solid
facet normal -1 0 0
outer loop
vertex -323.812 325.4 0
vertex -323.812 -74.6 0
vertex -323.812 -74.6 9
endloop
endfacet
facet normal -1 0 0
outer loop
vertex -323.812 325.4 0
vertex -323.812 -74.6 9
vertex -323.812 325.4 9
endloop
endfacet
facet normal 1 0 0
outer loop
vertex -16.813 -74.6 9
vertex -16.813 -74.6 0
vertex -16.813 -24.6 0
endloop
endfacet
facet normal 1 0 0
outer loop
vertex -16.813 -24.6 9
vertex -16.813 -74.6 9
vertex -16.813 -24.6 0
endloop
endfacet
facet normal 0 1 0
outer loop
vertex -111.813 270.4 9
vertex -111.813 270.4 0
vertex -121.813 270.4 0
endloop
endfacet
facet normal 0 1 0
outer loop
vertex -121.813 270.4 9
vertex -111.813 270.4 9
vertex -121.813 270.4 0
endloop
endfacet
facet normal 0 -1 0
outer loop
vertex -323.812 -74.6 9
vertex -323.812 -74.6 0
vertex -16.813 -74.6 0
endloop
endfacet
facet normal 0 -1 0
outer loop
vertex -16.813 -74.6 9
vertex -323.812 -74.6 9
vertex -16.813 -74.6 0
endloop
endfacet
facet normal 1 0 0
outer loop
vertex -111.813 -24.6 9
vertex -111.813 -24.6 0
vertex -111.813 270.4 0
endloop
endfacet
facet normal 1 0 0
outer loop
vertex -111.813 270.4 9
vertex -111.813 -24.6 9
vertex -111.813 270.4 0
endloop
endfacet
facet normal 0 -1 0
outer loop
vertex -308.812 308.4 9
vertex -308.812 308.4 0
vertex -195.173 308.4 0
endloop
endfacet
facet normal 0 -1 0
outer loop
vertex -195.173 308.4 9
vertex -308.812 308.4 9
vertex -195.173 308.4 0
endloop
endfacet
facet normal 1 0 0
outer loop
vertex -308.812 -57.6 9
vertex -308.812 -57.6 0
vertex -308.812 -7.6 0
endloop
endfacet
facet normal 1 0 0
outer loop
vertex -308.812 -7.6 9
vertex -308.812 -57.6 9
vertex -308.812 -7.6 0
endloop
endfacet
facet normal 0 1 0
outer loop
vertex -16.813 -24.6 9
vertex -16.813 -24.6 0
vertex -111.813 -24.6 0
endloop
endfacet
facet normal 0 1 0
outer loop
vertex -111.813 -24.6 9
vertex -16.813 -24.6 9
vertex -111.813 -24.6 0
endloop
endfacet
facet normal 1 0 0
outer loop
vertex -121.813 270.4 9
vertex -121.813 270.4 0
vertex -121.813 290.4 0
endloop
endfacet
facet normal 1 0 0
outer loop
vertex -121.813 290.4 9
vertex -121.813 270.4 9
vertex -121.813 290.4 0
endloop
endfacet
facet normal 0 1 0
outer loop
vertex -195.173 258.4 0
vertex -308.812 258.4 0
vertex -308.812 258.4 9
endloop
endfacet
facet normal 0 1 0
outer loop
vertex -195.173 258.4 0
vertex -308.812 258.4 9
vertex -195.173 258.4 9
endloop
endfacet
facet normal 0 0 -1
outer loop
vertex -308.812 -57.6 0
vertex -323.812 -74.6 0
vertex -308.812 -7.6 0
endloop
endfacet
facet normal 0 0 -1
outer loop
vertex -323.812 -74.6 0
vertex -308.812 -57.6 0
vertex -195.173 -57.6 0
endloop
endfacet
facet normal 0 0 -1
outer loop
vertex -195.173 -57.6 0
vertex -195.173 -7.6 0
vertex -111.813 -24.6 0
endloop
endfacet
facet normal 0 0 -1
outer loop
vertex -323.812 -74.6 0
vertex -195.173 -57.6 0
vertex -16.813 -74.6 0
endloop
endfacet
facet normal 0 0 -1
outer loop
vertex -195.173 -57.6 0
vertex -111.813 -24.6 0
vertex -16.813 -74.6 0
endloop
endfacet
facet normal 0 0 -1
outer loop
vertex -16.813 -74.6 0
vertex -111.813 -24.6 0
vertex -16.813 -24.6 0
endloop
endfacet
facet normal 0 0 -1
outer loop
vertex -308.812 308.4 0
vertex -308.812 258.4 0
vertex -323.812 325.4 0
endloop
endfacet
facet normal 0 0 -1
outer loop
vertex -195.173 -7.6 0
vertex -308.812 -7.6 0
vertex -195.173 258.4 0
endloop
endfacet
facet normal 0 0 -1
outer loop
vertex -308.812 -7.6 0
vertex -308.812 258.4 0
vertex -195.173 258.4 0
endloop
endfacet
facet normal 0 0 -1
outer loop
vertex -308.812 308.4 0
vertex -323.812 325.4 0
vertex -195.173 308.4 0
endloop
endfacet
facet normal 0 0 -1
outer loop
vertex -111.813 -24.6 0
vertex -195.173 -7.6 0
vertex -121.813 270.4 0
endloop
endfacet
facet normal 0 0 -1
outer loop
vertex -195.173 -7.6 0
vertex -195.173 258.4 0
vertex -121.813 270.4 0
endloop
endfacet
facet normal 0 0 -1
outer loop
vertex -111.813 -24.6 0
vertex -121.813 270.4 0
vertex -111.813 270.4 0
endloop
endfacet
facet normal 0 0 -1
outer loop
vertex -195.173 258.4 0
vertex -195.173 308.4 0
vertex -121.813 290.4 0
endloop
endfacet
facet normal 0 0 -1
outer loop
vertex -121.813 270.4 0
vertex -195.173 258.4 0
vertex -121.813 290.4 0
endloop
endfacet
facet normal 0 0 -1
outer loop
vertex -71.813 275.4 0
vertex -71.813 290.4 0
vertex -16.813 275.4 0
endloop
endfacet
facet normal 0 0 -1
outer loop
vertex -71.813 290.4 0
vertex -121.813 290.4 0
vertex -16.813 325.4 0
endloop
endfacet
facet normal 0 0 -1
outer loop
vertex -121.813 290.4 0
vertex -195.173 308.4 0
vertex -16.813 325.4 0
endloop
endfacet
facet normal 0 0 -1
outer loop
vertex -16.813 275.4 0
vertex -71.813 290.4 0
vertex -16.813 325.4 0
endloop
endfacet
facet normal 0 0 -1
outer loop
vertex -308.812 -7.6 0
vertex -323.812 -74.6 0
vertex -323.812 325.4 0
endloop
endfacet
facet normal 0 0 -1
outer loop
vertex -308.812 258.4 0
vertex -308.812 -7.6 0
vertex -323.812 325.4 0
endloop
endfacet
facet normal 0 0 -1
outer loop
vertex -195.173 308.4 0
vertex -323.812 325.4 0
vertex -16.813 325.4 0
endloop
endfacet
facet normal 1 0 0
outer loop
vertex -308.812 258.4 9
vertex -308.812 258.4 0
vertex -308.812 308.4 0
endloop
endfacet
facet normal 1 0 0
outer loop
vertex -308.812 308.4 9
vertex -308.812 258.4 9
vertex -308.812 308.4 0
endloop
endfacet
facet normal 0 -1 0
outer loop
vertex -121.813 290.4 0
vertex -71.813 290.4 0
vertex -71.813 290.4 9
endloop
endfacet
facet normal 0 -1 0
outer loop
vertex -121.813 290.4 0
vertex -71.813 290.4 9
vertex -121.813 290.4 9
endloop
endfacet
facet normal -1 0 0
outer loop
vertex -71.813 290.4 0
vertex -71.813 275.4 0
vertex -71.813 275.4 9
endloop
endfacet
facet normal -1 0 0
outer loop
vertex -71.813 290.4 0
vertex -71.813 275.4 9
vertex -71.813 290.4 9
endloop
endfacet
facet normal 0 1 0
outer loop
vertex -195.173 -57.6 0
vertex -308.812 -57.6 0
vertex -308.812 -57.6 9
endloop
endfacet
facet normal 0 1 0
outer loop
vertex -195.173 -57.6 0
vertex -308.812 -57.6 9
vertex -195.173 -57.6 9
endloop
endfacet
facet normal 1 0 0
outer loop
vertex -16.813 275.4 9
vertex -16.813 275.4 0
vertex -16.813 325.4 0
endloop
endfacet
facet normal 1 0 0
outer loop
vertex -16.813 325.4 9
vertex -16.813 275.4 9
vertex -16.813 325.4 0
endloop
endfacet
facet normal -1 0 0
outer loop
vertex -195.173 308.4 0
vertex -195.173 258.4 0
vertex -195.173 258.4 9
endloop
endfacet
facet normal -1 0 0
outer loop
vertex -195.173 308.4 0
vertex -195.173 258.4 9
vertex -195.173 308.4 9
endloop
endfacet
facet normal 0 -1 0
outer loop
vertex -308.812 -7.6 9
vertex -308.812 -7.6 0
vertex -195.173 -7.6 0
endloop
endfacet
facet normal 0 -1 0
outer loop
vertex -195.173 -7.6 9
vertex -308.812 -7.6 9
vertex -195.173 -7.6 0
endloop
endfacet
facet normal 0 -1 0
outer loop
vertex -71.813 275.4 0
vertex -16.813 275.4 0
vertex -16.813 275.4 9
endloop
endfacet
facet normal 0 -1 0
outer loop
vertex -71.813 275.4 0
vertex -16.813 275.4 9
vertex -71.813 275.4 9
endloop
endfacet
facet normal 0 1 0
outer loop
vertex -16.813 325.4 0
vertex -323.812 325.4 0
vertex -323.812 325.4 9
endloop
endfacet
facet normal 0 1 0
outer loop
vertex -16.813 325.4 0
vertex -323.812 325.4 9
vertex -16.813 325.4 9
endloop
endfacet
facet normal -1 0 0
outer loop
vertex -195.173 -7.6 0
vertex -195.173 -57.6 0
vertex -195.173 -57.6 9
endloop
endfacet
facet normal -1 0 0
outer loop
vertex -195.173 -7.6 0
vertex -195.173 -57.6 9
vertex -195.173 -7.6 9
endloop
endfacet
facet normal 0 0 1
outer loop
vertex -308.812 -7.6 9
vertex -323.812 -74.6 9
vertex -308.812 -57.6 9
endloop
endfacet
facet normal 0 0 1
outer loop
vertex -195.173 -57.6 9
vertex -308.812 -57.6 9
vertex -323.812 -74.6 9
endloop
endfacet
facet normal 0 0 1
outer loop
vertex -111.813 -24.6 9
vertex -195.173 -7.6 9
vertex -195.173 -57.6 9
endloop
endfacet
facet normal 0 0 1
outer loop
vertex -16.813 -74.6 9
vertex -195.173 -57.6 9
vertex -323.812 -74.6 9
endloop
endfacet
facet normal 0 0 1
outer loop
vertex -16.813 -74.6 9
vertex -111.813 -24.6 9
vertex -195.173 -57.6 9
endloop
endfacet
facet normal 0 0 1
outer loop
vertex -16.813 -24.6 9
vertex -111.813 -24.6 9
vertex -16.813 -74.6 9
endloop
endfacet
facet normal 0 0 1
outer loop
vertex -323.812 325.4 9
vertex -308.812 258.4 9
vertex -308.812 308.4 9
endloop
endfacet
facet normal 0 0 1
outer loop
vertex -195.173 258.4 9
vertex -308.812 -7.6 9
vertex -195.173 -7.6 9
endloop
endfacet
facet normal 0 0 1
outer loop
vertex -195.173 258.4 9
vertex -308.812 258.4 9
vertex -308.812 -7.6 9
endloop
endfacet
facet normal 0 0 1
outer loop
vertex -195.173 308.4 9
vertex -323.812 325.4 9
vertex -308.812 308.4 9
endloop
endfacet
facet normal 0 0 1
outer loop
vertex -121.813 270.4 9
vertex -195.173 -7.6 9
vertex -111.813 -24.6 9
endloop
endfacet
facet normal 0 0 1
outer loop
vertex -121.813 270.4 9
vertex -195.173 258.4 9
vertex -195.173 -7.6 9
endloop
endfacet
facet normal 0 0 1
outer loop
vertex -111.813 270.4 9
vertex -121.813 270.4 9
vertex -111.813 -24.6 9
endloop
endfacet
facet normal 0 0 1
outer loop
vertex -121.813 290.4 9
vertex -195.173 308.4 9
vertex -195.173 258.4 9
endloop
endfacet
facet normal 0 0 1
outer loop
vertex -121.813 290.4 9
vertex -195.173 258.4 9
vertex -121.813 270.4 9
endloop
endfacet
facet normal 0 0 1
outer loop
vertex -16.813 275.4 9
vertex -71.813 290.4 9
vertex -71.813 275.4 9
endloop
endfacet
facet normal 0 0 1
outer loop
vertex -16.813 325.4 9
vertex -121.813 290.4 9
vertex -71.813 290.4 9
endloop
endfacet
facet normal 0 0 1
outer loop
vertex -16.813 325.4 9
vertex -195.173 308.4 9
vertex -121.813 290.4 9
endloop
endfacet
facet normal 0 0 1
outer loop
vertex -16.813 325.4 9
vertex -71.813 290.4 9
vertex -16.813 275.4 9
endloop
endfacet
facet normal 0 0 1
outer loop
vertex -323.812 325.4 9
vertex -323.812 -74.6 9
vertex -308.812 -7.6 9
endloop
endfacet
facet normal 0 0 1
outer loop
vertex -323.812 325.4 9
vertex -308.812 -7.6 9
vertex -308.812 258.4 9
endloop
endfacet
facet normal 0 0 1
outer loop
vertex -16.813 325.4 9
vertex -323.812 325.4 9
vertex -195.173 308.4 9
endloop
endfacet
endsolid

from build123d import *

# Parameters (mm, degrees)
SKETCH1_W           = 306.999208532
SKETCH1_H           = 400
SKETCH1_W_2         = 113.639208532
SKETCH1_H_2         = 50
BOSS_EXTRUDE1_DEPTH = 9
SKETCH2_W           = 95
SKETCH2_H           = 300
CUT_EXTRUDE1_DEPTH  = 460.151907085
SKETCH3_W           = 40
SKETCH3_H           = 15
CUT_EXTRUDE2_DEPTH  = 10
SKETCH4_W           = 10
SKETCH4_H           = 20
CUT_EXTRUDE3_DEPTH  = 100


with BuildPart() as part:
    # Sketch1 → Boss-Extrude1 (new body)
    with BuildSketch(Plane.XY):
        with Locations((-170.312553906, 125.4)):
            Rectangle(SKETCH1_W, SKETCH1_H)
        with Locations((-251.992553906, 283.4)):
            Rectangle(SKETCH1_W_2, SKETCH1_H_2, mode=Mode.SUBTRACT)
        with Locations((-251.992553906, -32.6)):
            Rectangle(SKETCH1_W_2, SKETCH1_H_2, mode=Mode.SUBTRACT)
    extrude(amount=BOSS_EXTRUDE1_DEPTH)

    # Sketch2 → Cut-Extrude1 (cut, through all)
    with BuildSketch(Plane(origin=(0, 0, 0), x_dir=(-1, 0, 0), z_dir=(0, 0, -1))):
        with Locations((64.31294964, 125.4)):
            Rectangle(SKETCH2_W, SKETCH2_H)
    extrude(amount=-CUT_EXTRUDE1_DEPTH, mode=Mode.SUBTRACT)

    # Sketch3 → Cut-Extrude2 (cut)
    with BuildSketch(Plane(origin=(0, 0, 0), x_dir=(-1, 0, 0), z_dir=(0, 0, -1))):
        with Locations((91.81294964, 282.9)):
            Rectangle(SKETCH3_W, SKETCH3_H)
    extrude(amount=-CUT_EXTRUDE2_DEPTH, mode=Mode.SUBTRACT)

    # Sketch4 → Cut-Extrude3 (cut)
    with BuildSketch(Plane(origin=(0, 0, 0), x_dir=(-1, 0, 0), z_dir=(0, 0, -1))):
        with Locations((116.81294964, 280.4)):
            Rectangle(SKETCH4_W, SKETCH4_H)
    extrude(amount=-CUT_EXTRUDE3_DEPTH, mode=Mode.SUBTRACT)


solid = part.part
